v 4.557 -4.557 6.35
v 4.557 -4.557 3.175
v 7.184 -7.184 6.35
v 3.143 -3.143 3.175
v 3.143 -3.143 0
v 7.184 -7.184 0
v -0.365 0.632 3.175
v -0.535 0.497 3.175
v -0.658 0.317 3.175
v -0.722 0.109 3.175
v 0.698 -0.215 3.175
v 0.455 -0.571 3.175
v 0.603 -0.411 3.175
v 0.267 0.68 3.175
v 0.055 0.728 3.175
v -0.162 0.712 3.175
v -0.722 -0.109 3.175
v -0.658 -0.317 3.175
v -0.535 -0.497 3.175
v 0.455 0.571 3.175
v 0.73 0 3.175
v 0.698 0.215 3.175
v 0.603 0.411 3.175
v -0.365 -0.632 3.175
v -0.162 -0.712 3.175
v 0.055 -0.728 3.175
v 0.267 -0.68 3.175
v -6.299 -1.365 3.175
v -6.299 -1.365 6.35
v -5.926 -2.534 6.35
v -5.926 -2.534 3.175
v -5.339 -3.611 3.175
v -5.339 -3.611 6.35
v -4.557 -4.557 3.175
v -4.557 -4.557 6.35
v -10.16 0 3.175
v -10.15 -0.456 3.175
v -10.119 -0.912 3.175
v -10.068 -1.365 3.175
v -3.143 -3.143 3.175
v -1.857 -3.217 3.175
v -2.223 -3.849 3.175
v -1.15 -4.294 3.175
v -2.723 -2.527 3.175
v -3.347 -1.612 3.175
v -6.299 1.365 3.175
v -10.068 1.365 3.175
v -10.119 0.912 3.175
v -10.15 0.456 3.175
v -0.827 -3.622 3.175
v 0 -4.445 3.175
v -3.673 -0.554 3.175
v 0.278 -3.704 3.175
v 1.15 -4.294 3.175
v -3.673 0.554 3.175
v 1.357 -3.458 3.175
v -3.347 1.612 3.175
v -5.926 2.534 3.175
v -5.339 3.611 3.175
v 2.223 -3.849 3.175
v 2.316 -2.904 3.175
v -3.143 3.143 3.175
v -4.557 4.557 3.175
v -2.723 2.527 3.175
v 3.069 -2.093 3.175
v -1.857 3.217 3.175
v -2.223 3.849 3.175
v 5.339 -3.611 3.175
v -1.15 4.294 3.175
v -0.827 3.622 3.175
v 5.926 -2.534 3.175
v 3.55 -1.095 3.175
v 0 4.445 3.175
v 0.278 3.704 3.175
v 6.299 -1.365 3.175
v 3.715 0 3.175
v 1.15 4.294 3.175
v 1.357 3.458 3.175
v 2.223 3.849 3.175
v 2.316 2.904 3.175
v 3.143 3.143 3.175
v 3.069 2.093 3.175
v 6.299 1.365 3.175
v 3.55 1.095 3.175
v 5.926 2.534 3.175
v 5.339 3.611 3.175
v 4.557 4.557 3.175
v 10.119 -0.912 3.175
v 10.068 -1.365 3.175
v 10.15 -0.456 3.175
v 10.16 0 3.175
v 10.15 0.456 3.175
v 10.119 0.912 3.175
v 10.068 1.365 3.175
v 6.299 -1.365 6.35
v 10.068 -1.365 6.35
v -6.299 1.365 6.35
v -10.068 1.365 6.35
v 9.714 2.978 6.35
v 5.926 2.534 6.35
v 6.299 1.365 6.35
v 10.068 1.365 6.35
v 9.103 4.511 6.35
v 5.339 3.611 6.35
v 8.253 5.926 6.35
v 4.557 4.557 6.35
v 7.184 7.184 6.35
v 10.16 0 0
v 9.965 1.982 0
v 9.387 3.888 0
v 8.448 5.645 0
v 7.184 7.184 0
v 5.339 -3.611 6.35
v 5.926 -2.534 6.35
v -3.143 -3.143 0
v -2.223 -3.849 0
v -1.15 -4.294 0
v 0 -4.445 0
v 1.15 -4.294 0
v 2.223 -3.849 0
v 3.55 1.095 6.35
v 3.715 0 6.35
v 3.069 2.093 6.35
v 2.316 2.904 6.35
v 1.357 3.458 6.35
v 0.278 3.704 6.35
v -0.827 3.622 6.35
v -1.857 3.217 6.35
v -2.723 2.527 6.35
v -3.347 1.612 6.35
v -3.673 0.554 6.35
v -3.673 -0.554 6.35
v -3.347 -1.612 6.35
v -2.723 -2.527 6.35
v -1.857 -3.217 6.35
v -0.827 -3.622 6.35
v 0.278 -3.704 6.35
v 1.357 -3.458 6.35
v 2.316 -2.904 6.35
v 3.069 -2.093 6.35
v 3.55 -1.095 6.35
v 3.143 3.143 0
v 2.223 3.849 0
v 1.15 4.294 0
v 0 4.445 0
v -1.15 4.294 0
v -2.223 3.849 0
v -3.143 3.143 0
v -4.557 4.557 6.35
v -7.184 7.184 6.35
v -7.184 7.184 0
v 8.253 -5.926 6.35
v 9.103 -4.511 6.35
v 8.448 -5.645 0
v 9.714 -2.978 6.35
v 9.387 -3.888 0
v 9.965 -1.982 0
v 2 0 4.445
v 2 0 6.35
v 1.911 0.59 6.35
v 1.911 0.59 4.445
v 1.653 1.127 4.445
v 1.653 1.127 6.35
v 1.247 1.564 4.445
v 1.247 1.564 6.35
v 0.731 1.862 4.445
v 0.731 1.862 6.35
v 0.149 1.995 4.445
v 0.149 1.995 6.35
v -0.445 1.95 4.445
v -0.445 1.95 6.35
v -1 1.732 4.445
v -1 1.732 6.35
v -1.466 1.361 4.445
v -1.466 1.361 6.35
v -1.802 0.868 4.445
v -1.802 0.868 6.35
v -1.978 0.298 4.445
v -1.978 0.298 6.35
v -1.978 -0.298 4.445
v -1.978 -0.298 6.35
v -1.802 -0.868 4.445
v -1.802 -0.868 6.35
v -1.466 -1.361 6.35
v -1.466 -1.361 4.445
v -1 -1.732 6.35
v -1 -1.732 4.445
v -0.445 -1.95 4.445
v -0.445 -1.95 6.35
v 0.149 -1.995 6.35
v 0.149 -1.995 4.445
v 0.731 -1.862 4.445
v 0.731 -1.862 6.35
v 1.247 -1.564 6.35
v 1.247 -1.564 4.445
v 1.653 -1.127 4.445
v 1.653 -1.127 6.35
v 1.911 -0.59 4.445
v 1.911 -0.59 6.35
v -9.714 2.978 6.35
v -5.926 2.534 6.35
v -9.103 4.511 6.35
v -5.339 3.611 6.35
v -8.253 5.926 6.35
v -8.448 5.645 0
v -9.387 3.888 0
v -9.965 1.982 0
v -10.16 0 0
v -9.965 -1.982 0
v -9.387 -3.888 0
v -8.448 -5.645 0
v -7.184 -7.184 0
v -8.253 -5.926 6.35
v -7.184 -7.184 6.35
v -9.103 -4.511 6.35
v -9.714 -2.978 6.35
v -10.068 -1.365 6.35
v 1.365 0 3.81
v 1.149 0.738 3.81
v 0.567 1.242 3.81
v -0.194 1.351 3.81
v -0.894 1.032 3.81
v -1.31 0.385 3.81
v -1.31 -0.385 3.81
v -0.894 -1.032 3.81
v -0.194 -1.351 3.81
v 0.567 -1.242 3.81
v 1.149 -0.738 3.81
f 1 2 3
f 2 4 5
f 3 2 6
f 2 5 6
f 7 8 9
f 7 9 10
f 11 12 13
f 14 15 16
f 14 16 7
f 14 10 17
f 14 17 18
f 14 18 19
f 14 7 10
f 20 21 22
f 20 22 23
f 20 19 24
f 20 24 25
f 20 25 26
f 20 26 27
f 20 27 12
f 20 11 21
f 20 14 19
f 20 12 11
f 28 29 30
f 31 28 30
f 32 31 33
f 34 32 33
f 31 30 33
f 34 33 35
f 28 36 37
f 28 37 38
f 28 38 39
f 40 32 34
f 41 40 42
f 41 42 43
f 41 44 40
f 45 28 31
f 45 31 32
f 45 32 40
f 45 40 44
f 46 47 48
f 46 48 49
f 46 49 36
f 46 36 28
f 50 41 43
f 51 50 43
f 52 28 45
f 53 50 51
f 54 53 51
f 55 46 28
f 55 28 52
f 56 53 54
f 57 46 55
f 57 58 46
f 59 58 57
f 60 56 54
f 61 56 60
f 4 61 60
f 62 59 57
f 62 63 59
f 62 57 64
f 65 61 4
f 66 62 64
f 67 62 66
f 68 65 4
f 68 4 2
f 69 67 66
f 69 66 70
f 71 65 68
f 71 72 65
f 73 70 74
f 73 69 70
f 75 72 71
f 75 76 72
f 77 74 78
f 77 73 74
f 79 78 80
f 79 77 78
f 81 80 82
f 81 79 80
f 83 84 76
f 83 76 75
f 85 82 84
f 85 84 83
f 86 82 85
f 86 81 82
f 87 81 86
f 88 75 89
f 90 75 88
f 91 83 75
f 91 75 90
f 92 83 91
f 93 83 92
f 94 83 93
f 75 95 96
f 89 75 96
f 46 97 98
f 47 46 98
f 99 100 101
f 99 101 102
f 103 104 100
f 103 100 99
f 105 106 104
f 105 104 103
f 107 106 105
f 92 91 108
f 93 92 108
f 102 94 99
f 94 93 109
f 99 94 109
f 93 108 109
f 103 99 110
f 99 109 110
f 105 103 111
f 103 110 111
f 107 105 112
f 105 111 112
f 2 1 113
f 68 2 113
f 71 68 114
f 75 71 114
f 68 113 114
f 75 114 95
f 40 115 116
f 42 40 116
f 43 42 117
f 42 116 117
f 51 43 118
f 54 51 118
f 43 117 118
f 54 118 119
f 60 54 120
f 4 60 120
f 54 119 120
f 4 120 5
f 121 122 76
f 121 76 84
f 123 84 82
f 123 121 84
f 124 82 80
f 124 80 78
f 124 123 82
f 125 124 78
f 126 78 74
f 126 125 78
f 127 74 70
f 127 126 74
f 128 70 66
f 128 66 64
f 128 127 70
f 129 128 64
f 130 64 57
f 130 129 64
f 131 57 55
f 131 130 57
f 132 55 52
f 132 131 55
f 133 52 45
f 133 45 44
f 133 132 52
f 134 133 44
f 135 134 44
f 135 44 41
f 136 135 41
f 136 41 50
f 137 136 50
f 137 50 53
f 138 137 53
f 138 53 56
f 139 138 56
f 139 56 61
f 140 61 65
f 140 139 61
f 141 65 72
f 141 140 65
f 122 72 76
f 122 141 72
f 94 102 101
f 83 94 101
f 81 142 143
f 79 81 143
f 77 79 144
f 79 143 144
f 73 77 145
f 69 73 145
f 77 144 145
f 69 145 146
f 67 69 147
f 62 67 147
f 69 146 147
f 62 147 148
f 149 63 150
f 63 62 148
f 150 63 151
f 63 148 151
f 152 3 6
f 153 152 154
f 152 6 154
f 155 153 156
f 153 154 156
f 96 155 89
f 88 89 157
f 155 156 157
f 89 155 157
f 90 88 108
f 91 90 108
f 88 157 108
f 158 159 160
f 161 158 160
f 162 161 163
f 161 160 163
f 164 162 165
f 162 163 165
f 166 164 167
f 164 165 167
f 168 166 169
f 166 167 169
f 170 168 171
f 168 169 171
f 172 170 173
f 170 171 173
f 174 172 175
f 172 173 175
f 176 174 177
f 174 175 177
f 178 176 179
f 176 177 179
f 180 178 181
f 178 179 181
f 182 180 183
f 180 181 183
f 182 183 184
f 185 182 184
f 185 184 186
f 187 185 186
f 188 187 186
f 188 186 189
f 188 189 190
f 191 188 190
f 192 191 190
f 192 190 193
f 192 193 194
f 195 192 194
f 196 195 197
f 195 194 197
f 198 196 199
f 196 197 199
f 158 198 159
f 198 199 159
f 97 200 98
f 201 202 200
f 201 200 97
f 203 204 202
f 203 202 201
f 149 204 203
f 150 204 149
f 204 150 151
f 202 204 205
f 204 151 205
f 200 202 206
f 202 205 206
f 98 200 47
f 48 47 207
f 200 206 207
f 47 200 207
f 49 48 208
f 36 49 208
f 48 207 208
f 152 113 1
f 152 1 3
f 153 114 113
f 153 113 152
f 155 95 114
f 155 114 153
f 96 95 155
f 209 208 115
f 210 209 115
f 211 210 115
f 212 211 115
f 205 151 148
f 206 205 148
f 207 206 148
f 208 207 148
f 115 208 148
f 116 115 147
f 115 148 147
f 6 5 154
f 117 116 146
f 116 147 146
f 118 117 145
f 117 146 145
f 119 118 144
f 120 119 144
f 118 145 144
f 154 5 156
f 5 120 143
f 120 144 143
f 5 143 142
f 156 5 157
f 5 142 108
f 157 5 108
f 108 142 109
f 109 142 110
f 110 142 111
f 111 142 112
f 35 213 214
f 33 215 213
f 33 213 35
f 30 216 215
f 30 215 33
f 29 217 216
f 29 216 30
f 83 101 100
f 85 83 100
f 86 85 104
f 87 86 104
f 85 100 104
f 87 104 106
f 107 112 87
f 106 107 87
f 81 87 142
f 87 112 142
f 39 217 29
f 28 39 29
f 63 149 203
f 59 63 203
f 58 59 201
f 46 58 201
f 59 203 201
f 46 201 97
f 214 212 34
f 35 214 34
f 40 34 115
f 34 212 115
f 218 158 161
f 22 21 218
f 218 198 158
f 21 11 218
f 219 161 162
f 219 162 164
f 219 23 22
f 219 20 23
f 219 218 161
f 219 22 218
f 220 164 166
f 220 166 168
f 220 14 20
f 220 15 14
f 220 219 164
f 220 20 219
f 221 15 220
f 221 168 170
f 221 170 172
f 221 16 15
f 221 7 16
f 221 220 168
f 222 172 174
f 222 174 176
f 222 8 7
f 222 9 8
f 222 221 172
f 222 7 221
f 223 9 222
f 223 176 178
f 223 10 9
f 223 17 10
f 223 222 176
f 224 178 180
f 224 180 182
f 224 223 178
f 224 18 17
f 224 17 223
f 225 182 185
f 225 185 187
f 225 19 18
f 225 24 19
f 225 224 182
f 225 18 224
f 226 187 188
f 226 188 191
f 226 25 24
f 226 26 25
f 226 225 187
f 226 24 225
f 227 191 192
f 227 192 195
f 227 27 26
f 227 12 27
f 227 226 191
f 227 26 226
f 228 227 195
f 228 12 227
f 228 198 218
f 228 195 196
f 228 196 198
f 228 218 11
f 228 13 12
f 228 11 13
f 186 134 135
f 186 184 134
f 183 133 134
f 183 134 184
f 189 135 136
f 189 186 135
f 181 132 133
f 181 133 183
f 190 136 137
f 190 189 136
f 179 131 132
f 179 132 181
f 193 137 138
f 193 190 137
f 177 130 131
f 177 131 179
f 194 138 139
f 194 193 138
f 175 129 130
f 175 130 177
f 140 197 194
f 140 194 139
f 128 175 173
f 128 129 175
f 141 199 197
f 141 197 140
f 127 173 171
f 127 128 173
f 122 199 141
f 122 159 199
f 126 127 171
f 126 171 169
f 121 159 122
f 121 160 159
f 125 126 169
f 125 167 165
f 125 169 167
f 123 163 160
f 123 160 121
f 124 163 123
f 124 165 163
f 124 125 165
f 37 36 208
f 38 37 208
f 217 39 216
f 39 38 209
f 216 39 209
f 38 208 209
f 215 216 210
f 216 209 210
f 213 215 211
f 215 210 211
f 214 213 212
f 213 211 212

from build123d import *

# Parameters (mm, degrees)
F0_R     = 3.07975
F1_DEPTH = 6.35
F2_R     = 3.71475
F2_R_2   = 2.00025
F3_DEPTH = 3.175
F4_SIZE  = 1.27


# Not quite as in the source:
# - a feature names something its author has since deleted; it is built from what else it names


with BuildPart() as f1:
    # F0 (on Top) → F1 (new body)
    with BuildSketch(Plane.XY):
        with BuildLine():
            ThreePointArc((-4.445, 0), (-4.106644522, 1.7010278569), (-3.1430896424, 3.1430896424))
            Line((-3.1430896424, 3.1430896424), (-7.1842048969, 7.1842048969))
            ThreePointArc((-7.1842048969, 7.1842048969), (-9.3866160503, 3.8880636728), (-10.16, 0))
            ThreePointArc((-10.16, 0), (-9.3866160503, -3.8880636728), (-7.1842048969, -7.1842048969))
            Line((-7.1842048969, -7.1842048969), (-3.1430896424, -3.1430896424))
            ThreePointArc((-3.1430896424, -3.1430896424), (-4.106644522, -1.7010278569), (-4.445, 0))
        make_face()
        with BuildLine():
            ThreePointArc((3.1430896424, -3.1430896424), (4.106644522, -1.7010278569), (4.445, 0))
            ThreePointArc((4.445, 0), (4.106644522, 1.7010278569), (3.1430896424, 3.1430896424))
            ThreePointArc((3.1430896424, 3.1430896424), (0, 4.445), (-3.1430896424, 3.1430896424))
            ThreePointArc((-3.1430896424, 3.1430896424), (-4.106644522, 1.7010278569), (-4.445, 0))
            ThreePointArc((-4.445, 0), (-4.106644522, -1.7010278569), (-3.1430896424, -3.1430896424))
            ThreePointArc((-3.1430896424, -3.1430896424), (0, -4.445), (3.1430896424, -3.1430896424))
        make_face()
        Circle(F0_R, mode=Mode.SUBTRACT)
        with BuildLine():
            ThreePointArc((3.1430896424, 3.1430896424), (4.106644522, 1.7010278569), (4.445, 0))
            ThreePointArc((4.445, 0), (4.106644522, -1.7010278569), (3.1430896424, -3.1430896424))
            Line((3.1430896424, -3.1430896424), (7.1842048969, -7.1842048969))
            ThreePointArc((7.1842048969, -7.1842048969), (9.3866160503, -3.8880636728), (10.16, 0))
            ThreePointArc((10.16, 0), (9.3866160503, 3.8880636728), (7.1842048969, 7.1842048969))
            Line((7.1842048969, 7.1842048969), (3.1430896424, 3.1430896424))
        make_face()
        Circle(F0_R)
    extrude(amount=F1_DEPTH)

    # F2 (on face) → F3 (cut)
    with BuildSketch(Plane.XY.offset(6.35)):
        with BuildLine():
            ThreePointArc((6.298995158, -1.36525), (6.4085819845, -0.6865307789), (6.44525, 0))
            ThreePointArc((6.44525, 0), (6.4085819845, 0.6865307789), (6.298995158, 1.36525))
            ThreePointArc((6.298995158, 1.36525), (5.658033773, 3.0867298855), (4.5574799814, 4.5574799814))
            Line((4.5574799814, 4.5574799814), (3.1430896424, 3.1430896424))
            ThreePointArc((3.1430896424, 3.1430896424), (0, 4.445), (-3.1430896424, 3.1430896424))
            Line((-3.1430896424, 3.1430896424), (-4.5574799814, 4.5574799814))
            ThreePointArc((-4.5574799814, 4.5574799814), (-5.658033773, 3.0867298855), (-6.298995158, 1.36525))
            ThreePointArc((-6.298995158, 1.36525), (-6.44525, 0), (-6.298995158, -1.36525))
            ThreePointArc((-6.298995158, -1.36525), (-5.658033773, -3.0867298855), (-4.5574799814, -4.5574799814))
            Line((-4.5574799814, -4.5574799814), (-3.1430896424, -3.1430896424))
            ThreePointArc((-3.1430896424, -3.1430896424), (0, -4.445), (3.1430896424, -3.1430896424))
            Line((3.1430896424, -3.1430896424), (4.5574799814, -4.5574799814))
            ThreePointArc((4.5574799814, -4.5574799814), (5.658033773, -3.0867298855), (6.298995158, -1.36525))
        make_face()
        Circle(F2_R, mode=Mode.SUBTRACT)
        with BuildLine():
            ThreePointArc((6.298995158, 1.36525), (6.4085819845, 0.6865307789), (6.44525, 0))
            ThreePointArc((6.44525, 0), (6.4085819845, -0.6865307789), (6.298995158, -1.36525))
            Line((6.298995158, -1.36525), (10.0678544108, -1.36525))
            ThreePointArc((10.0678544108, -1.36525), (10.16, 0), (10.0678544108, 1.36525))
            Line((10.0678544108, 1.36525), (6.298995158, 1.36525))
        make_face()
        with BuildLine():
            ThreePointArc((-6.298995158, -1.36525), (-6.44525, 0), (-6.298995158, 1.36525))
            Line((-6.298995158, 1.36525), (-10.0678544108, 1.36525))
            ThreePointArc((-10.0678544108, 1.36525), (-10.16, 0), (-10.0678544108, -1.36525))
            Line((-10.0678544108, -1.36525), (-6.298995158, -1.36525))
        make_face()
        Circle(F2_R_2)
    extrude(amount=-F3_DEPTH, mode=Mode.SUBTRACT)

    # F4
    f4_edges = [f1.edges().sort_by_distance(p)[0] for p in [
        (-2.00025, 0, 3.175),
    ]]
    chamfer(f4_edges, length=F4_SIZE)


solid = f1.part
